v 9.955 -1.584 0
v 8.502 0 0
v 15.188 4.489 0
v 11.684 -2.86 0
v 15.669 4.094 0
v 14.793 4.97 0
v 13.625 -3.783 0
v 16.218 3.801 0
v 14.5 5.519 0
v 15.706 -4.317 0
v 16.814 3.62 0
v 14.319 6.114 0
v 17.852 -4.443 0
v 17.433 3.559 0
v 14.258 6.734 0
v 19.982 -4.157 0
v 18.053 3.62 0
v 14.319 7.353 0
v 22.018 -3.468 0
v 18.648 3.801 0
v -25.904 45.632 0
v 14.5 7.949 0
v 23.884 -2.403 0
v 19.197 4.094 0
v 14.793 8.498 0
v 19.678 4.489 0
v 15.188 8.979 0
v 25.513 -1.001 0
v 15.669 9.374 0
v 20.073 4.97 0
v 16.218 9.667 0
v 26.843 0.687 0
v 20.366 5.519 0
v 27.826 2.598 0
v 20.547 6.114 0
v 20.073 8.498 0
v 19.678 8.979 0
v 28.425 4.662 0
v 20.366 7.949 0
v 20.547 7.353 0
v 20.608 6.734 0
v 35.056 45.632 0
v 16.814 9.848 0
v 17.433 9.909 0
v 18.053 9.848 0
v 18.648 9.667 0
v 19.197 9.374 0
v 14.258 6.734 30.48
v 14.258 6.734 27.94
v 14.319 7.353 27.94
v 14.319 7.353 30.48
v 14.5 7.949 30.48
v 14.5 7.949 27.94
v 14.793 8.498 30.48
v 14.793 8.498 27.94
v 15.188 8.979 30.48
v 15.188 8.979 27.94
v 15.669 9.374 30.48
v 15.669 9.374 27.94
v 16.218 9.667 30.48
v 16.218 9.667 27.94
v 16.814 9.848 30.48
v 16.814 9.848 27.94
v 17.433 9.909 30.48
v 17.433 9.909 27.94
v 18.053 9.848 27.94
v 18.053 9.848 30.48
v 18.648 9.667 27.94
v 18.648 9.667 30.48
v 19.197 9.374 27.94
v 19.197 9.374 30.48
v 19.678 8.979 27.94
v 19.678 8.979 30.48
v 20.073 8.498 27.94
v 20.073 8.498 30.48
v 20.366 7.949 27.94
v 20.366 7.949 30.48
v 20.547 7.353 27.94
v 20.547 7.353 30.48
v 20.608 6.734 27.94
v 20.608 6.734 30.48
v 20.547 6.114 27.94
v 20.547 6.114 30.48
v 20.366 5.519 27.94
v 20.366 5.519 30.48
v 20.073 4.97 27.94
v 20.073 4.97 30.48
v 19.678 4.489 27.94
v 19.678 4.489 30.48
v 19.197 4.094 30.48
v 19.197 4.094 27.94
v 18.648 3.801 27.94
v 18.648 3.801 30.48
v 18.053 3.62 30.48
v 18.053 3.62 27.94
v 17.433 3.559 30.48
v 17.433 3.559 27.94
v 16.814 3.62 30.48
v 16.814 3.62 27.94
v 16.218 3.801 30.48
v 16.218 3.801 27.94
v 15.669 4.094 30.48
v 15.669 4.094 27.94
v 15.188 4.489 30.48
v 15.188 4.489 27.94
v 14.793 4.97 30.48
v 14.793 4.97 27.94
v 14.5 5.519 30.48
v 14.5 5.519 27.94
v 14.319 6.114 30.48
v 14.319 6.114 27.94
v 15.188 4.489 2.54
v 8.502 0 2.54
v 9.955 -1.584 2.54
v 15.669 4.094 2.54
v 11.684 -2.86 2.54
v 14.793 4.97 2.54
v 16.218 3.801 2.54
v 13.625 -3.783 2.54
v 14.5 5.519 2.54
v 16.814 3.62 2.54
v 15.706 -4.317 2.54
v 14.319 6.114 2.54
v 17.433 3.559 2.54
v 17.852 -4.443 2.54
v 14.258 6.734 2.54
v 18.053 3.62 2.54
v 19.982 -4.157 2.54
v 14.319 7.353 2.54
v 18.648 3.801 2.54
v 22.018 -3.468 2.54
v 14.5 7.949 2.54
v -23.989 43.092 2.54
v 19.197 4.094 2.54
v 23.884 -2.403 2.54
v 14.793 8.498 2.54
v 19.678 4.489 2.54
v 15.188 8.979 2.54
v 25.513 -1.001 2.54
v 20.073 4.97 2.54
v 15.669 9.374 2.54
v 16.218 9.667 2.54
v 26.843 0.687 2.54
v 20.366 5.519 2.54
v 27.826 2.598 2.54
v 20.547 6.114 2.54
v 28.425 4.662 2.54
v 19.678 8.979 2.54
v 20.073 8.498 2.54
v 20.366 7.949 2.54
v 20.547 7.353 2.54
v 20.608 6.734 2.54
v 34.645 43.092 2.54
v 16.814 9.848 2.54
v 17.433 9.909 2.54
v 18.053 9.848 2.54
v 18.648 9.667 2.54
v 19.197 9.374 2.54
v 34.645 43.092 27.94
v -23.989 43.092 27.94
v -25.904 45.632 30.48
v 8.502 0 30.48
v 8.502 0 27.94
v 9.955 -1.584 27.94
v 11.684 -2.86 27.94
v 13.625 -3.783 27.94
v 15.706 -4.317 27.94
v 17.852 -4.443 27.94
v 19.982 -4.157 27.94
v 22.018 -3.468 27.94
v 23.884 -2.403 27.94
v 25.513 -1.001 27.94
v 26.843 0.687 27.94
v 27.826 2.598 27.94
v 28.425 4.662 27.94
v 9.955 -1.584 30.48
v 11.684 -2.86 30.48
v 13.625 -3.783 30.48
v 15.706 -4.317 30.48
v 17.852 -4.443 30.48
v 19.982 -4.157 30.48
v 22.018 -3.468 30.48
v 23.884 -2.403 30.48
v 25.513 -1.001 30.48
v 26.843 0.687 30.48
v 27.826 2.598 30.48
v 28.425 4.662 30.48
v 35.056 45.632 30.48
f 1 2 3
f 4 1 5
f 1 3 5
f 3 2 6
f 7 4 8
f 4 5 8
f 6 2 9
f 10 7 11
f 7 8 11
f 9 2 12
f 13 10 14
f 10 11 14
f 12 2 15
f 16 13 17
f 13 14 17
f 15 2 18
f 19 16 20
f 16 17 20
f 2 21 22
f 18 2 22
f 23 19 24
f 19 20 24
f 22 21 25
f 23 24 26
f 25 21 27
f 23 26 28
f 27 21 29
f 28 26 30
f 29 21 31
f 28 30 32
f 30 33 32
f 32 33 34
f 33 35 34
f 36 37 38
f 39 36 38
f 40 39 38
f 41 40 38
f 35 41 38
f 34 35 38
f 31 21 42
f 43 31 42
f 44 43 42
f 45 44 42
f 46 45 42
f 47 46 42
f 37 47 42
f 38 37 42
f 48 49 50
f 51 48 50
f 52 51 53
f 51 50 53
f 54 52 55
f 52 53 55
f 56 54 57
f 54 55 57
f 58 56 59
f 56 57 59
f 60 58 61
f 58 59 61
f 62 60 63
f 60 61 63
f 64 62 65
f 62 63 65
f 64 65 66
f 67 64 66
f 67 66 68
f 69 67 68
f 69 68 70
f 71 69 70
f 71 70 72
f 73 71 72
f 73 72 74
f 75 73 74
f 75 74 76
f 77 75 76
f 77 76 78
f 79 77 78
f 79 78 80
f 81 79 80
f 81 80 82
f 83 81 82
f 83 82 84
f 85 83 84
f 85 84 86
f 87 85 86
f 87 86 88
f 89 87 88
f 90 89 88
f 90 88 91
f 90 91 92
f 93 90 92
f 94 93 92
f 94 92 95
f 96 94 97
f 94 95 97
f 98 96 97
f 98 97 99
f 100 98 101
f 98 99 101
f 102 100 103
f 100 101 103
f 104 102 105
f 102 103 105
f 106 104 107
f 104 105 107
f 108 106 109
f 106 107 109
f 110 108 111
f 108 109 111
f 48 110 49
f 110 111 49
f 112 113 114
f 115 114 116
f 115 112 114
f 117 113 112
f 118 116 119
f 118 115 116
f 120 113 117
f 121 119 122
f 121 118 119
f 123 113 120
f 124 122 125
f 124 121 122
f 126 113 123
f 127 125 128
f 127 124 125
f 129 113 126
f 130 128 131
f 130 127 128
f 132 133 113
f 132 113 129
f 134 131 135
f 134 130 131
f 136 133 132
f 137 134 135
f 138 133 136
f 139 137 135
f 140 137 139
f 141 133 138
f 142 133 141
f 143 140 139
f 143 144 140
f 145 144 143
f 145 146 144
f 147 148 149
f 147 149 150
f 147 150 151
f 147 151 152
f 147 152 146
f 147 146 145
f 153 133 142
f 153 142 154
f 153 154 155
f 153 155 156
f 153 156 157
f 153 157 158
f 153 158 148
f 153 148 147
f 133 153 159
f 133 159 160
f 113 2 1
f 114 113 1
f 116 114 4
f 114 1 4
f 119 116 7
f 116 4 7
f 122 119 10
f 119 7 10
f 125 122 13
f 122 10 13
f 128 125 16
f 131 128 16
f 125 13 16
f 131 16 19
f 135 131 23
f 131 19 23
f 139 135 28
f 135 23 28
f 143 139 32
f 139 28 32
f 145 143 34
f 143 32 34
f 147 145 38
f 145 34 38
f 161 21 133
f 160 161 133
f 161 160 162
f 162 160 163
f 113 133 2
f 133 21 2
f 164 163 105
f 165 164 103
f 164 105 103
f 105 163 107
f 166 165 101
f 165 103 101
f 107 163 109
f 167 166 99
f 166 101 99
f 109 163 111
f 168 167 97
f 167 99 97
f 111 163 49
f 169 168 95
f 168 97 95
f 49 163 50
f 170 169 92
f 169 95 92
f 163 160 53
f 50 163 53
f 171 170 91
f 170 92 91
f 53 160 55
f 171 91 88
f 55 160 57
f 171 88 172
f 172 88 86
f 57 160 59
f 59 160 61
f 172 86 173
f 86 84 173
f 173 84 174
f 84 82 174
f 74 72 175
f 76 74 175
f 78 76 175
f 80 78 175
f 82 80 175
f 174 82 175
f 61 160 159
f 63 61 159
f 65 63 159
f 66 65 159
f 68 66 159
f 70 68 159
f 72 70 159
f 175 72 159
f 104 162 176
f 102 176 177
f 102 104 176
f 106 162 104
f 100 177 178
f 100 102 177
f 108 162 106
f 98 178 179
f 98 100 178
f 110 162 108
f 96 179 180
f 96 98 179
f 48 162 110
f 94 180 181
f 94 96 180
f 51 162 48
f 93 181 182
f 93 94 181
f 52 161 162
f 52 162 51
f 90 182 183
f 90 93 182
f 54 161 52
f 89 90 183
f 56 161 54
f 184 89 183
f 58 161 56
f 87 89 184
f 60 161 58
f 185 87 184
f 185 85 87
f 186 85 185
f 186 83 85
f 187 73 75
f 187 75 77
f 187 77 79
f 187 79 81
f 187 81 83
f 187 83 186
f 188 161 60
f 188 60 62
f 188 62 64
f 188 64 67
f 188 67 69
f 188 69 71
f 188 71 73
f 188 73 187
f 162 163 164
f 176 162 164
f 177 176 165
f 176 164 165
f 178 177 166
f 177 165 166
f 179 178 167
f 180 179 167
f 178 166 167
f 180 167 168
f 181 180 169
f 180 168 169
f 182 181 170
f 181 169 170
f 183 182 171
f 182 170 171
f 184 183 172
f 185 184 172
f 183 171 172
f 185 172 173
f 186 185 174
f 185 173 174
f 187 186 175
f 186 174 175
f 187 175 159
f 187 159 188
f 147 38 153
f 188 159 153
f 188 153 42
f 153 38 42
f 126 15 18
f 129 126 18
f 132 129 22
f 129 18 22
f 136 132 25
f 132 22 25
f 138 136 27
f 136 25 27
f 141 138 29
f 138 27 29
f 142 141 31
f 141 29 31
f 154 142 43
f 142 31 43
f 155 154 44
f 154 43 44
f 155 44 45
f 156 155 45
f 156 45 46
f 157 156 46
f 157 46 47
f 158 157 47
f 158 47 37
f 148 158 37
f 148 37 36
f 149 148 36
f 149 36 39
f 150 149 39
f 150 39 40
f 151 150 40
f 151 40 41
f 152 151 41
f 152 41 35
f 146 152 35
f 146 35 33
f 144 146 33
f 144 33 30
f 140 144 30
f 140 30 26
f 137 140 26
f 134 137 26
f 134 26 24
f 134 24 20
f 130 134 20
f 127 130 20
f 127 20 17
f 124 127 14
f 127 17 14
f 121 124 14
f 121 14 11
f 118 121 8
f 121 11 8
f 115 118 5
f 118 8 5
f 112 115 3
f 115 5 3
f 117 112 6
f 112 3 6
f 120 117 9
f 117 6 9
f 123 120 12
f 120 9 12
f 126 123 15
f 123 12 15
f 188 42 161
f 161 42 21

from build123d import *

# Parameters (mm, degrees)
F1_DEPTH = 30.48
F2_T     = -2.54
F4_D     = 6.35


with BuildPart() as f1:
    # F0 (on Top) → F1 (new body)
    with BuildSketch(Plane.XY):
        with BuildLine():
            Line((28.424608, 4.662237), (35.055646, 45.632264))
            Line((35.055646, 45.632264), (-25.904354, 45.632264))
            Line((-25.904354, 45.632264), (8.502317, 0))
            ThreePointArc((8.502317, 0), (19.9818, -4.156915), (28.424608, 4.662237))
        make_face()
    extrude(amount=F1_DEPTH)

    # F2
    f2_openings = [f1.faces().sort_by_distance(p)[0] for p in [
        (19.9818, -4.156915, 15.24),
        (31.740127, 25.14725, 15.24),
        (-8.701018, 22.816132, 15.24),
    ]]
    offset(amount=F2_T, openings=f2_openings)

    # F4 (through all)
    with Locations(Plane.XY.offset(30.48)):
        with Locations((17.433136, 6.733826)):
            Hole(F4_D / 2)


solid = f1.part
